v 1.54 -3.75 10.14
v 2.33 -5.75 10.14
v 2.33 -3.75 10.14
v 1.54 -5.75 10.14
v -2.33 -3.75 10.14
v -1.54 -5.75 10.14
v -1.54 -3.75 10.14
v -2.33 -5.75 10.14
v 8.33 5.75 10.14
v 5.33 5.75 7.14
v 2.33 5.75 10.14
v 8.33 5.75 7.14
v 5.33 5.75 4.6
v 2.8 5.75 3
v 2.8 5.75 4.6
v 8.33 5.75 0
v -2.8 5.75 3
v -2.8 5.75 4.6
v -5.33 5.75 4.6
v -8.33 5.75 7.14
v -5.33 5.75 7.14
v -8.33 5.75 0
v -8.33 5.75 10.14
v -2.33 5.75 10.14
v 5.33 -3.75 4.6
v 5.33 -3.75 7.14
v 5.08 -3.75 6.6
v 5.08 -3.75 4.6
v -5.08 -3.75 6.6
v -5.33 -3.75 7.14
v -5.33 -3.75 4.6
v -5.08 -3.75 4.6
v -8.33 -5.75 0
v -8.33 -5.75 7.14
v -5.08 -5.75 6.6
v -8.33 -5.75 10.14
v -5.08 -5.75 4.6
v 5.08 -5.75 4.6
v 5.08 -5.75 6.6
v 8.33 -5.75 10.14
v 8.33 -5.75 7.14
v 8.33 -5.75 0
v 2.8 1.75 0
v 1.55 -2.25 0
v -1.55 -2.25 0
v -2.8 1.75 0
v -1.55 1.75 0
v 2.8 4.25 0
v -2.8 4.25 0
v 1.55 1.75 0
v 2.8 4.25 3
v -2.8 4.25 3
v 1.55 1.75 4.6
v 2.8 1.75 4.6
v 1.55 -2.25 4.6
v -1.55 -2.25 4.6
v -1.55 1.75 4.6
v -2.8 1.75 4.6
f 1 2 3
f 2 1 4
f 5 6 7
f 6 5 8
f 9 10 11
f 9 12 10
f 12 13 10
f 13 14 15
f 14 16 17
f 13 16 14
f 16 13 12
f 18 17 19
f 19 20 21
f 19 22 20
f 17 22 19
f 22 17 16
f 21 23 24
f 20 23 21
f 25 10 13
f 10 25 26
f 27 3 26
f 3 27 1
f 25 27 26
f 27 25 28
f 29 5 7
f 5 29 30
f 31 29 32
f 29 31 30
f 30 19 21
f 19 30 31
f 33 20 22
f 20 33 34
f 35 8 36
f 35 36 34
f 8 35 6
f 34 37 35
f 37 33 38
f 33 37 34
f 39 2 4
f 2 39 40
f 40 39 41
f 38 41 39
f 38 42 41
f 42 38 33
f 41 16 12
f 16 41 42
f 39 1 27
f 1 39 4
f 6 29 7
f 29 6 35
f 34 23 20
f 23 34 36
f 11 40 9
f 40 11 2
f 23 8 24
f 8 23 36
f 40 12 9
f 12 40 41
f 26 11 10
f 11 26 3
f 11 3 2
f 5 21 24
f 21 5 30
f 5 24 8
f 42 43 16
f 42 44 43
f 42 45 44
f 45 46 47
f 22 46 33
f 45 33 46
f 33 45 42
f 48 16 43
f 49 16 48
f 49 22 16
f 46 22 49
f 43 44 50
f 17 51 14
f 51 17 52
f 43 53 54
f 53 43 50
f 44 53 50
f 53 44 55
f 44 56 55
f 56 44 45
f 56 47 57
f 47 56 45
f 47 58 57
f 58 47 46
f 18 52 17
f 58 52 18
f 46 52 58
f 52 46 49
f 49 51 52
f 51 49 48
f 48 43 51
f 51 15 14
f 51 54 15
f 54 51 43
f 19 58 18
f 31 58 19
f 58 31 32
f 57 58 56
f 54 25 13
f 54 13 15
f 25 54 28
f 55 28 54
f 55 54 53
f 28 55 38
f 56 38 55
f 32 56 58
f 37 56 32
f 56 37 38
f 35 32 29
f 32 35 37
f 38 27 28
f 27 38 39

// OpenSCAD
wallthick = 3;
pins = 4;
bridge = false;

linear_extrude(height = wallthick, convexity = 2) difference() {
	square([pins * 2.54 + .5 + wallthick * 2, 11.5], center = true);
	#translate([0, 3, 0]) square([5.6, 2.5], center = true);
	#translate([0, 1, 0]) square([3.1, 6.5], center = true);
}

linear_extrude(height = wallthick + 1.6, convexity = 2) difference() {
	square([pins * 2.54 + .5 + wallthick * 2, 11.5], center = true);
	#translate([0, 4, 0]) square([5.6, 4.5], center = true);
	#translate([0, 2, 0]) square([3.1, 8.5], center = true);
}

linear_extrude(height = wallthick + 1.6 + 3, convexity = 2) difference() {
	square([pins * 2.54 + .5 + wallthick * 2, 11.5], center = true);
	#translate([0, 2, 0]) square([pins * 2.54 + .5, 11.5], center = true);
	#translate([0, -2, 0]) square([pins * 2.54, 11.5], center = true);
}

translate([0, 0, wallthick + 1.6 + 2]) difference() {
	linear_extrude(height = wallthick + .54, convexity = 2) difference() {
		square([pins * 2.54 + .5 + wallthick * 2, 11.5], center = true);
		#translate([0, 2, 0]) square([pins * 2.54 + .5, 11.5], center = true);
	}
	translate([0, -2, 0]) rotate([0, 45, 0]) cube([(pins * 2.54) / sqrt(2), 11.5, (pins * 2.54) / sqrt(2)], center = true);
}

translate([0, 0, wallthick + 1.6 + 2.54]) difference() {
	linear_extrude(height = wallthick, convexity = 2) difference() {
		square([pins * 2.54 + .5 + wallthick * 2, 11.5], center = true);
	}
	translate([0, 0, 0]) rotate([0, 45, 0]) cube([(pins * 2.54 + .5) / sqrt(2), 12, (pins * 2.54 + .5) / sqrt(2)], center = true);
	translate([0, -2, 0]) rotate([0, 45, 0]) cube([(pins * 2.54) / sqrt(2), 11.5, (pins * 2.54) / sqrt(2)], center = true);
}

if (bridge) translate([0, 0, wallthick + 1.6 + 3]) linear_extrude(height = wallthick, convexity = 2) square([pins * 2.54 + .5 + wallthick * 2, 11.5], center = true);
